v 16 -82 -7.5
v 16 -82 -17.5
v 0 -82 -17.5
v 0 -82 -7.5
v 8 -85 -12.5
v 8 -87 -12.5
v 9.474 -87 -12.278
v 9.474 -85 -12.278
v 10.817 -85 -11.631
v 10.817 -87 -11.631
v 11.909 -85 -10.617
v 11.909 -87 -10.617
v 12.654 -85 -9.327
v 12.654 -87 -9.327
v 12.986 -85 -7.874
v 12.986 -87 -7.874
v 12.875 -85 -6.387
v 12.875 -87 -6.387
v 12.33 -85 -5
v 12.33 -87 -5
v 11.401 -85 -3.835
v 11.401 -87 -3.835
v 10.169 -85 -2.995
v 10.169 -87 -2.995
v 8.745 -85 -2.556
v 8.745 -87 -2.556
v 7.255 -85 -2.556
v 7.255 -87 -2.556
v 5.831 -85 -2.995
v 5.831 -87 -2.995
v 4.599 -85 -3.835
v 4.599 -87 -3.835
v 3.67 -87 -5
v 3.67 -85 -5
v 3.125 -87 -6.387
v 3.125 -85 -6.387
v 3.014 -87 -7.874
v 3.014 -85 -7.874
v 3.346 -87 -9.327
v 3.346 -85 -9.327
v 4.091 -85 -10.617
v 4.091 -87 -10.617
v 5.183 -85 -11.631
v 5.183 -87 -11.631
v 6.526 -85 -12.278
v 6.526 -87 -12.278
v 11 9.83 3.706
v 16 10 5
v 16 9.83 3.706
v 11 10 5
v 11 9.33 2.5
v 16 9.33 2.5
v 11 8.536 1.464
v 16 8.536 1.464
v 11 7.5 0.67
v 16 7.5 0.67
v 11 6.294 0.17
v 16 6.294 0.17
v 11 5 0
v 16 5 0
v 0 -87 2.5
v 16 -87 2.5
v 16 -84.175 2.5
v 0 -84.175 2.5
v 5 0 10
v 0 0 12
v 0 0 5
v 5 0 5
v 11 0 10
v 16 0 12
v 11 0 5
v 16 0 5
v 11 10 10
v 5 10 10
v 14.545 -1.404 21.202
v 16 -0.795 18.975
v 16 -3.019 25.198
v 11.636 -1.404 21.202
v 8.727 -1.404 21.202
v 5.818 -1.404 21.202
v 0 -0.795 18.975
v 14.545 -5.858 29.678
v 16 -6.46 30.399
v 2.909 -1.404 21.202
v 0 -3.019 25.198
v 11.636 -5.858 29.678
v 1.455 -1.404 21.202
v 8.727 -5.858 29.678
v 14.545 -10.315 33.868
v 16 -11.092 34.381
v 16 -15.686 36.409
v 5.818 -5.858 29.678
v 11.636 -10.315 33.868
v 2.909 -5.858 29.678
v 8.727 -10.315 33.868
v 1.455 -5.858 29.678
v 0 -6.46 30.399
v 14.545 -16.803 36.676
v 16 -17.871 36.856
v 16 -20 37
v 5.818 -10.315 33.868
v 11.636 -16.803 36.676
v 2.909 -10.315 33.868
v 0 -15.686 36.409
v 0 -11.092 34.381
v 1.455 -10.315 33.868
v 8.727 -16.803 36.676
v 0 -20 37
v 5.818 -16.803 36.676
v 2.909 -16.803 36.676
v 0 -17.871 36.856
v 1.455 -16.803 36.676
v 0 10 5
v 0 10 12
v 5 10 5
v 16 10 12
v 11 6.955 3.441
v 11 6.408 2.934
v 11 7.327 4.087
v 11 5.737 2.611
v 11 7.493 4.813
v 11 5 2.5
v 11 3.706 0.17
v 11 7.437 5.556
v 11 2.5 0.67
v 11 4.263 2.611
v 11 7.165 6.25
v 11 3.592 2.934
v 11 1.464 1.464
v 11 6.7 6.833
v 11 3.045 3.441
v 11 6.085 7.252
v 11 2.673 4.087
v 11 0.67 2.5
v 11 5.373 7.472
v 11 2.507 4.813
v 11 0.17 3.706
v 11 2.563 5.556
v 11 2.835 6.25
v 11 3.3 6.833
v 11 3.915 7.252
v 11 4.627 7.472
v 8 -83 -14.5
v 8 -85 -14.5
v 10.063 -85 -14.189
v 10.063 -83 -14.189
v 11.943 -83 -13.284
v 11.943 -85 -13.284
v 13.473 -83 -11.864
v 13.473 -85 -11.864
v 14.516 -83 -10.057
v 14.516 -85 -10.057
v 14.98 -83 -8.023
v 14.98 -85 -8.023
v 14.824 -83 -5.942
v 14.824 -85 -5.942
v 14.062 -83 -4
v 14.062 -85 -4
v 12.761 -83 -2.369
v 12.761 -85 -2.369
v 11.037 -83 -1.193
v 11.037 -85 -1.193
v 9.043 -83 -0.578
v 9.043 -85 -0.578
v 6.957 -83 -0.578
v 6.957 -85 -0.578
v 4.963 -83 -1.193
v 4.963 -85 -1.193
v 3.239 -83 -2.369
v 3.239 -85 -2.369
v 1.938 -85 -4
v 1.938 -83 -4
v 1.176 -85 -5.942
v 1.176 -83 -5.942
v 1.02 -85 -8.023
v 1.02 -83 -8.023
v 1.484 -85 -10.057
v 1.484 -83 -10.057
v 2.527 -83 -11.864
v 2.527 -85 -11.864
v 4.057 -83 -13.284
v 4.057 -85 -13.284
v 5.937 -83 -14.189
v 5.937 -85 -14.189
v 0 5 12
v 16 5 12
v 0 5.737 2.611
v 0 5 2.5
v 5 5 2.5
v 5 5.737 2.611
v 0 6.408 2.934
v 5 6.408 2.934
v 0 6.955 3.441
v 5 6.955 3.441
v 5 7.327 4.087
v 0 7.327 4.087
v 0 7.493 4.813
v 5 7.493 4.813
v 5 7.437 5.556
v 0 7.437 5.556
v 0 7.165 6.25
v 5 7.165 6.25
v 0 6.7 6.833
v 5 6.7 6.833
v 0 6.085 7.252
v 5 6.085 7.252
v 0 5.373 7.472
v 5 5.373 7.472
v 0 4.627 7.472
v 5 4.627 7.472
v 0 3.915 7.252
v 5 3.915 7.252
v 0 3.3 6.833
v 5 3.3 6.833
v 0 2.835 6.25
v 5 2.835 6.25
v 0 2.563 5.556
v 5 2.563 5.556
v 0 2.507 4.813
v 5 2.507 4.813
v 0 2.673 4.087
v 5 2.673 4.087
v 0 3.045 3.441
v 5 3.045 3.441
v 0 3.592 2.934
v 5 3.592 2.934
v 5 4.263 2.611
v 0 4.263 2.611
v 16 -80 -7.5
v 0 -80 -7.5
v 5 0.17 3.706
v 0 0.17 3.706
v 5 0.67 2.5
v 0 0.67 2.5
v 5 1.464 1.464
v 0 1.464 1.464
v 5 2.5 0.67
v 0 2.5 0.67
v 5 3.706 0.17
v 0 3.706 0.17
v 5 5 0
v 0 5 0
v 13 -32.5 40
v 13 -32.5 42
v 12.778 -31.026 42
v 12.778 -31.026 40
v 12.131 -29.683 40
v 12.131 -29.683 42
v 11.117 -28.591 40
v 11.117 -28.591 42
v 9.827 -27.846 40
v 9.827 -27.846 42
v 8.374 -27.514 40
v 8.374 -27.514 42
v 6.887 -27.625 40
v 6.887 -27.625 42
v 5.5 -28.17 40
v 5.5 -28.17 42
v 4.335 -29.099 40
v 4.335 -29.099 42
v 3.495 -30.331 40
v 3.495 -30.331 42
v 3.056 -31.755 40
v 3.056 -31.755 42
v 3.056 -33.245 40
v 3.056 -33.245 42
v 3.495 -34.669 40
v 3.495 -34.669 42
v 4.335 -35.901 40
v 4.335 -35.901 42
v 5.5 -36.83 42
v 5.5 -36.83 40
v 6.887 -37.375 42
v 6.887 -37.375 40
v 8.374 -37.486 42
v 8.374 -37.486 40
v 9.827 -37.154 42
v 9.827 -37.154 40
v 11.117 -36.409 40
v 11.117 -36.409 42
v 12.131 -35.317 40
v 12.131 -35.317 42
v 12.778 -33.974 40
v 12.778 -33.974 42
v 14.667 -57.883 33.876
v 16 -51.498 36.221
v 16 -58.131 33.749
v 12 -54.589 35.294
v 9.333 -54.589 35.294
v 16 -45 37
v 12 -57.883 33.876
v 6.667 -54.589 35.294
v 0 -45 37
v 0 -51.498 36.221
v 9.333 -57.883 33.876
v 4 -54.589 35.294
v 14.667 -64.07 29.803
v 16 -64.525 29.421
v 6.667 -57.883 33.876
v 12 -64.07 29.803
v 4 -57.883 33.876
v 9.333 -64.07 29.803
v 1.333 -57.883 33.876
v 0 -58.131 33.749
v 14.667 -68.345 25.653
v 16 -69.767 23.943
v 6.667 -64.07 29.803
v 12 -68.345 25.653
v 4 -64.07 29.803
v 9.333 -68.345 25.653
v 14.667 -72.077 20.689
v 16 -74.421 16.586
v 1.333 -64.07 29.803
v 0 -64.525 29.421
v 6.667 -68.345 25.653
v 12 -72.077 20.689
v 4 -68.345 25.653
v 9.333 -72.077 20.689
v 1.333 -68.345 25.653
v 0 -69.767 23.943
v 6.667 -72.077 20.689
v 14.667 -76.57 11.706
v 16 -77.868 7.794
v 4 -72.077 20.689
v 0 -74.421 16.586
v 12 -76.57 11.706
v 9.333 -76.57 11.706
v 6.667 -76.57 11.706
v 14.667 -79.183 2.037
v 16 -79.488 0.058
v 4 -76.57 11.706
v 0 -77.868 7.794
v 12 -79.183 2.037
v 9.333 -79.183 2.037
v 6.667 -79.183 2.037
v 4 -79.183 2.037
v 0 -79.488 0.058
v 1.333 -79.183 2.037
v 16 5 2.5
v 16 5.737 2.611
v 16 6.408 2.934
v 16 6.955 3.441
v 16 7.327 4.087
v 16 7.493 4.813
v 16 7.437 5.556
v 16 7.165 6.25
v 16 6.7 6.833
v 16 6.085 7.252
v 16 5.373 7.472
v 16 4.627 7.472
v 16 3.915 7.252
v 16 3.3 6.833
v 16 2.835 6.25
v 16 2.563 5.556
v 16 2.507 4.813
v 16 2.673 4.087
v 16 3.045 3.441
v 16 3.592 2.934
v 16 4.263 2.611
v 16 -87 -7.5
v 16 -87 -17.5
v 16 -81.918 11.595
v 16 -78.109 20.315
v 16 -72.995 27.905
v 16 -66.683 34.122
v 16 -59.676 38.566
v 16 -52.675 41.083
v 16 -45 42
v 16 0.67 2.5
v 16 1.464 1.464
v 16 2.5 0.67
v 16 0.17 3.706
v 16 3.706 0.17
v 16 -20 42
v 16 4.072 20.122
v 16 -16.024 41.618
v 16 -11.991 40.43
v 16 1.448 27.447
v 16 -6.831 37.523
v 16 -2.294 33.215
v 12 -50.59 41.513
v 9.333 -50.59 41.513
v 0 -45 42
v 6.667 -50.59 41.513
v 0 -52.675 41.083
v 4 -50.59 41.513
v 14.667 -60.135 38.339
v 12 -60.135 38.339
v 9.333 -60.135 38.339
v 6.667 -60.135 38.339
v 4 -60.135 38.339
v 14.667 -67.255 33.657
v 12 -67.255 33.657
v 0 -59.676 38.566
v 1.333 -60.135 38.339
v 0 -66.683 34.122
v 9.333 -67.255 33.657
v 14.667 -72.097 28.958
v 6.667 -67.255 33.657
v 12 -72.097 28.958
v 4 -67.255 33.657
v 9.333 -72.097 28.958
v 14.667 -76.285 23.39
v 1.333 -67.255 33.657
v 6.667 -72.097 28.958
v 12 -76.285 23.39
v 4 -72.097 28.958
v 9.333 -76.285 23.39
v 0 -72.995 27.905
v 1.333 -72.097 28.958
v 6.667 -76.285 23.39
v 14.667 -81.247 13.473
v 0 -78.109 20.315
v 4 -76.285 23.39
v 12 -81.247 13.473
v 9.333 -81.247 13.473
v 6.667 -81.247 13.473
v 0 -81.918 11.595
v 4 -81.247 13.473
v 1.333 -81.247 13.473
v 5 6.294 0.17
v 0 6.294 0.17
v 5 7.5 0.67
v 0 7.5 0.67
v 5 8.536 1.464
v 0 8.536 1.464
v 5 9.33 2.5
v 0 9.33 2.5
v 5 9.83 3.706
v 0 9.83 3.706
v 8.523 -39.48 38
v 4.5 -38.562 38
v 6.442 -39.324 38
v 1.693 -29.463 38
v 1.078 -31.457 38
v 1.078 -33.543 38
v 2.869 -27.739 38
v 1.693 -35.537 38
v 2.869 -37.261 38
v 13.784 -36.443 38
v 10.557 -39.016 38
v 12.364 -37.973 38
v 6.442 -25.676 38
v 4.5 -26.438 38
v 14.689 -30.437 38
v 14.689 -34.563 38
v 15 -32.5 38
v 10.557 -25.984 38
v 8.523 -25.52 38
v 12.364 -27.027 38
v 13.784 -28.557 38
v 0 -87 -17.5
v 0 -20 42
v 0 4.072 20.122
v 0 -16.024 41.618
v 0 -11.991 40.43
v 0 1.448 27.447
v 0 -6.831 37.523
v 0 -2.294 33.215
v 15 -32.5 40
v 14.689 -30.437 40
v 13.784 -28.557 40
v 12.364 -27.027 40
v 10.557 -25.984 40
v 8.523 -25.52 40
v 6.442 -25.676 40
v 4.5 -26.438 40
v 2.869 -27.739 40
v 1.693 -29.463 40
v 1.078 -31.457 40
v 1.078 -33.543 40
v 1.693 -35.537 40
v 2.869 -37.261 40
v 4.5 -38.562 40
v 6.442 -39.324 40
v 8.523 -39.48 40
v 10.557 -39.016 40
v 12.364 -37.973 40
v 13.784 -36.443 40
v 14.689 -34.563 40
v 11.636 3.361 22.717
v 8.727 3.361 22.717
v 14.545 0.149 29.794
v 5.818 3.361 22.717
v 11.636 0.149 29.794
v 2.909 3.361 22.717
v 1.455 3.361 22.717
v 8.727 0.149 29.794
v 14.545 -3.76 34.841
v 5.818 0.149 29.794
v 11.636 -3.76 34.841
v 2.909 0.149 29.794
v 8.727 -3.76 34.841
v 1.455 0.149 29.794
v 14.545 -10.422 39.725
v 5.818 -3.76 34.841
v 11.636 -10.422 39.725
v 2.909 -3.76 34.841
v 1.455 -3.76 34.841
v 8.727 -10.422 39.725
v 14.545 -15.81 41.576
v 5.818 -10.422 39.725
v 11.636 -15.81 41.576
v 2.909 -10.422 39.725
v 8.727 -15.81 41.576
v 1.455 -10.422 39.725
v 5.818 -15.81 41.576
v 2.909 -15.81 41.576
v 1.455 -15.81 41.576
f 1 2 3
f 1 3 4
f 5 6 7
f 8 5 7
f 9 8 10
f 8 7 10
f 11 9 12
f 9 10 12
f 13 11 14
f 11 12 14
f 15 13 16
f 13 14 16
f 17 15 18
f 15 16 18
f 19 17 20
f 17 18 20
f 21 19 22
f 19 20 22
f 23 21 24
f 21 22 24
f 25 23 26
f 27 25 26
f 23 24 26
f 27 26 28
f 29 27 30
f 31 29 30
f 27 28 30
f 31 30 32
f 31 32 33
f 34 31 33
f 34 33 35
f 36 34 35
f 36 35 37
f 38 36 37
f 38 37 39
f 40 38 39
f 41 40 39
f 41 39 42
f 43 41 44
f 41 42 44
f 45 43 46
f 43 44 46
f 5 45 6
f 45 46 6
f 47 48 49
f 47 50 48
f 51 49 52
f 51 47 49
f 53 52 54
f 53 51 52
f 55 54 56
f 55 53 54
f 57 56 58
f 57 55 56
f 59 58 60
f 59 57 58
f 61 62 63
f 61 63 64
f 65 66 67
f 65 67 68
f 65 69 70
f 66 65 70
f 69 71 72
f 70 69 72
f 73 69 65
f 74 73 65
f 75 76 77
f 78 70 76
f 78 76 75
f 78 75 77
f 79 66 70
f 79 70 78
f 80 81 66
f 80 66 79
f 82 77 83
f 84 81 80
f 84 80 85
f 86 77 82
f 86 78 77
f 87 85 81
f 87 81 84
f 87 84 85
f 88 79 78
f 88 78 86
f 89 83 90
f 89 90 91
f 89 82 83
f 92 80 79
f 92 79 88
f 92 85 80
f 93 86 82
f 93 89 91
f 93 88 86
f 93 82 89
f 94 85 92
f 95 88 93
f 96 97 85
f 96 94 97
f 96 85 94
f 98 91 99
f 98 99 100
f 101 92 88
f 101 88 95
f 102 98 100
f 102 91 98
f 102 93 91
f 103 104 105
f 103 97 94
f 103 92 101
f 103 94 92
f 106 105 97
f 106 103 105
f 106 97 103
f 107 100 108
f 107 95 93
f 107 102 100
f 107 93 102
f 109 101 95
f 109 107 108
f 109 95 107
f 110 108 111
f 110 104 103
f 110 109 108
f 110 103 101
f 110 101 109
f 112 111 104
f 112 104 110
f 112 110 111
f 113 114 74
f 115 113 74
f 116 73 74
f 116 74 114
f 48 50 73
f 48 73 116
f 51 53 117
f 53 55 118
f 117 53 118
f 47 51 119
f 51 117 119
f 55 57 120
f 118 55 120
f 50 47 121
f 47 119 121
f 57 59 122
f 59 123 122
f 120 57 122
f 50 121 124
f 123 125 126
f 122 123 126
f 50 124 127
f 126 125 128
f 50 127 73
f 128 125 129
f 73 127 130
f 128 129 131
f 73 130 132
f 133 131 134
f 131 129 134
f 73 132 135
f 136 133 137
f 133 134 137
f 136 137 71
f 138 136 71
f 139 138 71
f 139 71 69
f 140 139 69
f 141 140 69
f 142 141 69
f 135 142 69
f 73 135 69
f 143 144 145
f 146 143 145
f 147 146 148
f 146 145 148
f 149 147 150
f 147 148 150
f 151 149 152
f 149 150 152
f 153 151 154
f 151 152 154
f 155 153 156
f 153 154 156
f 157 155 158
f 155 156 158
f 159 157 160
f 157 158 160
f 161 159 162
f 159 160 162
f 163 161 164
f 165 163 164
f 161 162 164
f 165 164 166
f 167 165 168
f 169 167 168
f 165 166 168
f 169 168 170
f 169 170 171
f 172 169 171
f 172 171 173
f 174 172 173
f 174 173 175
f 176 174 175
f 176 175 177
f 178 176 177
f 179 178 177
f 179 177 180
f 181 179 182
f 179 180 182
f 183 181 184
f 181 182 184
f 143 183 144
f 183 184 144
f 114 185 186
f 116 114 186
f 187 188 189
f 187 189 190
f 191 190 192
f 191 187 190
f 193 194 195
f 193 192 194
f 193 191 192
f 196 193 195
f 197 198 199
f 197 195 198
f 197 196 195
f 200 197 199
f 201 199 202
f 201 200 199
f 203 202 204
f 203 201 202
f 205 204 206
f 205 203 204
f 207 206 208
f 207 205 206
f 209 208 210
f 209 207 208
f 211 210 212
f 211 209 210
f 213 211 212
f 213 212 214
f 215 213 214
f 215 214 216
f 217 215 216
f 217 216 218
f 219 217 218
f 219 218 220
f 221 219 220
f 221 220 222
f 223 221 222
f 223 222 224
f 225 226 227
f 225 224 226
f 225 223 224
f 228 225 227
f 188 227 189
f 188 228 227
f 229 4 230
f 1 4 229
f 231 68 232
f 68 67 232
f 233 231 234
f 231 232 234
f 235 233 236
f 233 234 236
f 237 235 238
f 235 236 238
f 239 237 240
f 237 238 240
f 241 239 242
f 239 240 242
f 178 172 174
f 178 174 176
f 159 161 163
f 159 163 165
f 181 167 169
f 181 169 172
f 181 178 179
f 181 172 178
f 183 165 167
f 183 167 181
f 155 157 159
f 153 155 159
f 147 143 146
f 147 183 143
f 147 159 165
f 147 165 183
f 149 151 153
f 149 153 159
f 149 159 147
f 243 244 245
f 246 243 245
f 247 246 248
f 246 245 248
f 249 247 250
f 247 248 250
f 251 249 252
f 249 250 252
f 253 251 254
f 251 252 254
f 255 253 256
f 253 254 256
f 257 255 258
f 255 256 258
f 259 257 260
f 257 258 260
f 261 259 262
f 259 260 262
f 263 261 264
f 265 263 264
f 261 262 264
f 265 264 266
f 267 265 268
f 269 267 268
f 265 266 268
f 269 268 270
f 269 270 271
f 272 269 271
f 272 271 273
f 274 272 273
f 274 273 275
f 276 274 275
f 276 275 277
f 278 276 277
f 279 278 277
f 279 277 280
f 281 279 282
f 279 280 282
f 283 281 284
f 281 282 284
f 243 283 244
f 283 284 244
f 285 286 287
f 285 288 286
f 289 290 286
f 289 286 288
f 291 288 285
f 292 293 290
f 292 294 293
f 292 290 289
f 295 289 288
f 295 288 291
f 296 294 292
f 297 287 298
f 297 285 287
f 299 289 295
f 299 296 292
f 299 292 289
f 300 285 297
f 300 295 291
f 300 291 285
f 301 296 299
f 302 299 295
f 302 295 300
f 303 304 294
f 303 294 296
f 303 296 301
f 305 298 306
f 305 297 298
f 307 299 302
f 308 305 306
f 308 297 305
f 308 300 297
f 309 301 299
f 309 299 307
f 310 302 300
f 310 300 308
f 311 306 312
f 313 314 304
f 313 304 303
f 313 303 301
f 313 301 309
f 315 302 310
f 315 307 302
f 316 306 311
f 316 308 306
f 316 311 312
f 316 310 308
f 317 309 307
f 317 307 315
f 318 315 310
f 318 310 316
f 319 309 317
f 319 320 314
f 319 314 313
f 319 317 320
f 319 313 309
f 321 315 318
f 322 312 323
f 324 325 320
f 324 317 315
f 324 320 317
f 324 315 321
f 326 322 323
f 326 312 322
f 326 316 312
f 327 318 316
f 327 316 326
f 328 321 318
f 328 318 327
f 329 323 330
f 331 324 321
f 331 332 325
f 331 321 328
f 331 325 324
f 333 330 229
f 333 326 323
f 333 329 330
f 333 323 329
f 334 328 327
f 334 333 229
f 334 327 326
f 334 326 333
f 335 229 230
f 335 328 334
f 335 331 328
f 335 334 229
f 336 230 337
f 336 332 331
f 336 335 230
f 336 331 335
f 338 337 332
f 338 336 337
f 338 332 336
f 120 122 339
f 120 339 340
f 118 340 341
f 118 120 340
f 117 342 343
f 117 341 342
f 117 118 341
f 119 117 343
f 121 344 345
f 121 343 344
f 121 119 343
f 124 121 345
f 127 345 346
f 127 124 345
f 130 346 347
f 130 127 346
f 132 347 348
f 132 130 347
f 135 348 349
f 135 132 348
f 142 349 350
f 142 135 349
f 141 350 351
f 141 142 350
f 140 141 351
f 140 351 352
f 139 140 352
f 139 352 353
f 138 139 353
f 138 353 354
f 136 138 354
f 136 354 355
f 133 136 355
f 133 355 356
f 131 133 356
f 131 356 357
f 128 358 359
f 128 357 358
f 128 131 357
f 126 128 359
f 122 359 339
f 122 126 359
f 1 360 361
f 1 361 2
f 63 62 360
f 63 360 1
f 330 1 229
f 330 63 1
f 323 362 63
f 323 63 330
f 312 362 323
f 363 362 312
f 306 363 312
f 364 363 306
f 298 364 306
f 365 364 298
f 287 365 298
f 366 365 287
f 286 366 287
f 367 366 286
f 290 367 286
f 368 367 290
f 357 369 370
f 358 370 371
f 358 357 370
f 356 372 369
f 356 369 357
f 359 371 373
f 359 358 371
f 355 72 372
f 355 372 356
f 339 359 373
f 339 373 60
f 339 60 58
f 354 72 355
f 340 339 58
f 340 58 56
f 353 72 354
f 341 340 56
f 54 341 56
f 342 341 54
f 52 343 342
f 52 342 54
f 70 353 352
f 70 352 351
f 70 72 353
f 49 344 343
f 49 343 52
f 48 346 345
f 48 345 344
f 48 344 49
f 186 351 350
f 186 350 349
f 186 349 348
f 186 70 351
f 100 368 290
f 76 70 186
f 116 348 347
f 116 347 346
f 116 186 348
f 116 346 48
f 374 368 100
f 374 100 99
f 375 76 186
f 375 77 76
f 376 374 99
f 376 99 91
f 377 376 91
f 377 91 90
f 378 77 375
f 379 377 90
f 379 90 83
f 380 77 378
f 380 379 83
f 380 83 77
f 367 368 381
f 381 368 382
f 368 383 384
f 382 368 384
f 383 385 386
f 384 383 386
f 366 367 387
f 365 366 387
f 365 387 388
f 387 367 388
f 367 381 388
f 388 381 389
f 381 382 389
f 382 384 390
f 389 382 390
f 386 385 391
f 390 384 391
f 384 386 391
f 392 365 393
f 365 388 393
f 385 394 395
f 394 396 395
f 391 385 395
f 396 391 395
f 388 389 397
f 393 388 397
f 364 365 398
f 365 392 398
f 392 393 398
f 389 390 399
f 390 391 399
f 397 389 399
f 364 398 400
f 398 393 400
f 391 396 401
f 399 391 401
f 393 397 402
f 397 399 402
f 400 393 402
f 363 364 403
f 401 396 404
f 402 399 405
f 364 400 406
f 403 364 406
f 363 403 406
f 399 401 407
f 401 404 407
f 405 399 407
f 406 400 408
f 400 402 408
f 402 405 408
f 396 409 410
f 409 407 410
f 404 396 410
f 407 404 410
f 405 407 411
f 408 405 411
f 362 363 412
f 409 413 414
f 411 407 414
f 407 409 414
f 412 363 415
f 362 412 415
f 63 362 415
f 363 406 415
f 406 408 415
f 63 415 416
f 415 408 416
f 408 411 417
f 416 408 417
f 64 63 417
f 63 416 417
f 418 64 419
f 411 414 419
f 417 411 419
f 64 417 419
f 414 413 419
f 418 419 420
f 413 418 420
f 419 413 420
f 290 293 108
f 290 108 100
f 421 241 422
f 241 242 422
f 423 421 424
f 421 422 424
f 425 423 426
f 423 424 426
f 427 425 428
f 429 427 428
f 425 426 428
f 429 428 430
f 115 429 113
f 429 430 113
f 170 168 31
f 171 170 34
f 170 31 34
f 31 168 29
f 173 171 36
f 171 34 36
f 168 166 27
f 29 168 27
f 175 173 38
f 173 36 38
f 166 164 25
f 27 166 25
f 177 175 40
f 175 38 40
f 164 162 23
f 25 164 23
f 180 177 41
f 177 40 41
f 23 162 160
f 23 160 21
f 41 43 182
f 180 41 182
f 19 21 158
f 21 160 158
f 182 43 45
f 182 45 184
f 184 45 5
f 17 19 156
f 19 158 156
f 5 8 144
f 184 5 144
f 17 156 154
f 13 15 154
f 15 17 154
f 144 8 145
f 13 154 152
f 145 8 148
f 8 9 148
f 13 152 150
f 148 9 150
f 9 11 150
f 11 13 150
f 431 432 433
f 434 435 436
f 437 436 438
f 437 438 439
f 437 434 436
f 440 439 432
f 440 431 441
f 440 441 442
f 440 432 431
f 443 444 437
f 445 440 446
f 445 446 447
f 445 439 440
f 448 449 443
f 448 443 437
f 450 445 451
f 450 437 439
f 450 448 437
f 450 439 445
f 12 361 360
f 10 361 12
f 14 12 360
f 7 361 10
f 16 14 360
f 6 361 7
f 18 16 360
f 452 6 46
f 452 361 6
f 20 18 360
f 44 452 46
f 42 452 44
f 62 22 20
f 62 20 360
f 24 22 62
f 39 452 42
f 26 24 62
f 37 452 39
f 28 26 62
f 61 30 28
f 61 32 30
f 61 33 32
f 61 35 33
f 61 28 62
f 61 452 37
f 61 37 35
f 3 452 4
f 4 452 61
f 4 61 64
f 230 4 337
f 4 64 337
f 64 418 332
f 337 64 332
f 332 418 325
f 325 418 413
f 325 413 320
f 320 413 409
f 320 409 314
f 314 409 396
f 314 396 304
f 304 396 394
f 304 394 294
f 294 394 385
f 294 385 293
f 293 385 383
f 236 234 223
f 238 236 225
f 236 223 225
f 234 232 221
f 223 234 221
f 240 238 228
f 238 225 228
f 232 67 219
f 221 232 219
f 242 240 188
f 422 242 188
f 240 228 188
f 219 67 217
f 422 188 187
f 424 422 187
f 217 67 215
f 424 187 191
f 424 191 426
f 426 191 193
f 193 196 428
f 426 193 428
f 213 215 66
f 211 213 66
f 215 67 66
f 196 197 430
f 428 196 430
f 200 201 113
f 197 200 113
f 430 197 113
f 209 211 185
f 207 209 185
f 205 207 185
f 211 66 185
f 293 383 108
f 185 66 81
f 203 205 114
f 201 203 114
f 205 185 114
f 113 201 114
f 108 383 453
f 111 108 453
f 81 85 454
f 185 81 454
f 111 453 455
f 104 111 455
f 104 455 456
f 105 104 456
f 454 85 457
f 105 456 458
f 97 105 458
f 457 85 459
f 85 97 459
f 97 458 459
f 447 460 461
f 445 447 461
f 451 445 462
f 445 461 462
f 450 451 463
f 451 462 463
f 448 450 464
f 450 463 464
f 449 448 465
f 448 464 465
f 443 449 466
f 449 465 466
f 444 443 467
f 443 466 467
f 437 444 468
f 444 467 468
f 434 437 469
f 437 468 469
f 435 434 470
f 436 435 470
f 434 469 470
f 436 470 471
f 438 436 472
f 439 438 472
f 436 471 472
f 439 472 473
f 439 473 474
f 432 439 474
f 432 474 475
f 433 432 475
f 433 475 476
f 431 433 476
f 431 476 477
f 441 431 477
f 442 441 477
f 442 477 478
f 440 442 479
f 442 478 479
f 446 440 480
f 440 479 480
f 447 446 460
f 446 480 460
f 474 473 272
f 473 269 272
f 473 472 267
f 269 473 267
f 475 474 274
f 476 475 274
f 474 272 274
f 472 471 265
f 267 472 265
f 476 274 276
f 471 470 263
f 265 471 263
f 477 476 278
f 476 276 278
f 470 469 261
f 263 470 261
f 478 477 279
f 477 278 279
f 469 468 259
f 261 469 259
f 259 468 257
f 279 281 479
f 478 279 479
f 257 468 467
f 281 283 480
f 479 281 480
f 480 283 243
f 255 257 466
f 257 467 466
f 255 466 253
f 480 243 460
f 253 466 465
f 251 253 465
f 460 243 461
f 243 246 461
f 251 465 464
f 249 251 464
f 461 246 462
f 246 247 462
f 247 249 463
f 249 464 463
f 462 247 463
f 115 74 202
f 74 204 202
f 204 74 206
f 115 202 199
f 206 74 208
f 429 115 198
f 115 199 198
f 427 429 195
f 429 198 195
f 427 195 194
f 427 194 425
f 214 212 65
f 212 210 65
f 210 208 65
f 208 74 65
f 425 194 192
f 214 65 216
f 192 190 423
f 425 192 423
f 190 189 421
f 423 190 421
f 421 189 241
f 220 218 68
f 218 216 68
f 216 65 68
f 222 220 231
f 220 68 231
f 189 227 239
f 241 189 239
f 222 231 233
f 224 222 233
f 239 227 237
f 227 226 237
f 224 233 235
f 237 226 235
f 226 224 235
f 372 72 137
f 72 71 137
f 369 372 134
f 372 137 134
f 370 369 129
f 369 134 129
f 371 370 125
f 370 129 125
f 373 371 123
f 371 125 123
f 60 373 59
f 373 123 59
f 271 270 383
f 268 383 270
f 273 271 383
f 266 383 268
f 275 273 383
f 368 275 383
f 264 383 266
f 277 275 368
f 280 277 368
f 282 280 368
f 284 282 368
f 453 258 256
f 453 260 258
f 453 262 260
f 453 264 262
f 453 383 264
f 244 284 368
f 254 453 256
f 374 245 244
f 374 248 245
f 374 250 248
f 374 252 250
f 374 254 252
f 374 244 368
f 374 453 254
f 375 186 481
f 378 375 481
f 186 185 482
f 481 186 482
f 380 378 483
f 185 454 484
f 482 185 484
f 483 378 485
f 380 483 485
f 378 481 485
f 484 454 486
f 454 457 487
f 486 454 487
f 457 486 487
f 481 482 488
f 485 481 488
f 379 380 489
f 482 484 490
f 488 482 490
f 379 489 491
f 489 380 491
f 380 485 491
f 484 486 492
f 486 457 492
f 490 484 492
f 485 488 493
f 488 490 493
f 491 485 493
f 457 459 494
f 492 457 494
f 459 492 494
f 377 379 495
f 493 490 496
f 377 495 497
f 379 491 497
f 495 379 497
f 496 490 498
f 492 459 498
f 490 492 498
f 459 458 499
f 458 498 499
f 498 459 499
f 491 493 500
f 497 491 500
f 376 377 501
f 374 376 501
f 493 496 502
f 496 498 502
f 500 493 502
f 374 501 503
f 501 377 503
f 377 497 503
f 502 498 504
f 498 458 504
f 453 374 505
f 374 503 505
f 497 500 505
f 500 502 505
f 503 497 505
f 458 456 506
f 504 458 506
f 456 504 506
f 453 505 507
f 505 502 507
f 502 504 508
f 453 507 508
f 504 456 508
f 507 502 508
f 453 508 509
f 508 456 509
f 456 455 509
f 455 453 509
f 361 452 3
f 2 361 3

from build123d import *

# Parameters (mm, degrees)
BOSS_EXTRUDE2_DEPTH     = 10
CUT_EXTRUDE1_DEPTH      = 20.104973175
CUT_EXTRUDE1_DEPTH_BACK = 20.104973175
SKETCH3_R               = 2.5
SWEEP2_DEPTH            = 16
SKETCH6_W               = 16
SKETCH6_H               = 5
BOSS_EXTRUDE3_DEPTH     = 25
SWEEP4_DEPTH            = 16
BOSS_EXTRUDE6_START     = -2
BOSS_EXTRUDE6_DEPTH     = 5
MIRROR1_OUTLINE_W       = 5
MIRROR1_OUTLINE_H       = 10
MIRROR1_DEPTH           = 16
SKETCH10_R              = 5
CUT_EXTRUDE2_DEPTH      = 2
SKETCH11_R              = 7
CUT_EXTRUDE3_DEPTH      = 2
SKETCH12_R              = 5
CUT_EXTRUDE4_DEPTH      = 2
SKETCH13_R              = 7
CUT_EXTRUDE5_DEPTH      = 2
FILLET1_R               = 5


# Read off the part's stored shape, not the designer's step: Sweep2, Sweep4, Mirror1
with BuildPart() as part:
    # Sketch1 → Boss-Extrude2 (new body)
    with BuildSketch(Plane(origin=(0, 0, 0), x_dir=(1, 0, 0), z_dir=(0, 1, 0))):
        Polygon((16, 0), (11, 0), (11, -10), (5, -10), (5, 0), (0, 0), (0, -12), (16, -12), align=None)
    extrude(amount=BOSS_EXTRUDE2_DEPTH)

    # Sketch3 → Cut-Extrude1 (cut, two sides: drawn at the far end of the back side and taken through both)
    with BuildSketch(Plane(origin=(5, 0, 0), x_dir=(0, 0, -1), z_dir=(1, 0, 0)).offset(-CUT_EXTRUDE1_DEPTH_BACK)):
        with Locations((-5, 5)):
            Circle(SKETCH3_R)
    extrude(amount=CUT_EXTRUDE1_DEPTH + CUT_EXTRUDE1_DEPTH_BACK, mode=Mode.SUBTRACT)

    # Sweep2 outline → Sweep2 (add)
    with BuildSketch(Plane.YZ):
        with BuildLine():
            Line((0, 12), (5, 12))
            add(Edge.make_bspline(
                [(5, 12), (4.988564835, 13.918737728), (4.727583023, 17.475192083), (3.864503942, 21.128495988), (3.223332084, 23.150620925), (2.391953002, 25.596644311), (0.741742694, 29.07437946), (-1.195562511, 31.850987055), (-2.528545692, 33.517302555), (-4.236222293, 35.44635739), (-7.052881596, 37.829760239), (-9.410175401, 39.223738473), (-10.800753457, 39.913031483), (-12.581881784, 40.734670966), (-15.819763626, 41.734575995), (-18.630582656, 41.980830062), (-20, 42)],
                knots=[0, 0, 0, 0, 0.14, 0.25, 0.25, 0.28, 0.42, 0.5, 0.5, 0.56, 0.67, 0.75, 0.75, 0.78, 0.89, 1, 1, 1, 1], degree=3))
            Line((-20, 42), (-20, 37))
            add(Edge.make_bspline(
                [(0, 12), (0, 13.649915823), (-0.240561875, 16.726331061), (-0.97538393, 19.848301285), (-1.521193083, 21.57165859), (-2.228979288, 23.654488426), (-3.634756743, 26.603340395), (-5.233025509, 28.896620946), (-6.326493526, 30.263455967), (-7.72168743, 31.836224776), (-10.002621636, 33.761203681), (-11.850285326, 34.854843846), (-12.93353849, 35.390906407), (-14.317667102, 36.027380757), (-16.81674582, 36.792085808), (-18.962910054, 37), (-20, 37)],
                knots=[0, 0, 0, 0, 0.14, 0.25, 0.25, 0.28, 0.42, 0.5, 0.5, 0.56, 0.67, 0.75, 0.75, 0.78, 0.89, 1, 1, 1, 1], degree=3))
        make_face()
    extrude(amount=SWEEP2_DEPTH)

    # Sketch6 → Boss-Extrude3 (add)
    with BuildSketch(Plane.XZ.offset(20)):
        with Locations((8, 39.5)):
            Rectangle(SKETCH6_W, SKETCH6_H)
    extrude(amount=BOSS_EXTRUDE3_DEPTH)

    # Sweep4 outline → Sweep4 (add)
    with BuildSketch(Plane.YZ):
        with BuildLine():
            add(Edge.make_bspline(
                [(-45, 37), (-46.539921435, 37), (-49.710455321, 36.733564359), (-54.069426949, 35.591421338), (-56.791855208, 34.424962301), (-58.400322026, 33.61534539), (-60.515823703, 32.472825795), (-64.131778614, 29.955184919), (-67.512968495, 26.682711344), (-69.293125668, 24.545529462), (-70.568838354, 22.923551904), (-73.245629189, 19.149689178), (-75.823464115, 13.964627374), (-77.246943912, 9.829702386), (-78.247594027, 6.616051335), (-79.558969896, 1.063749954), (-80, -4.423299828), (-80, -7.5)],
                knots=[0, 0, 0, 0, 0.093333333, 0.186666667, 0.25, 0.25, 0.28, 0.373333333, 0.466666667, 0.5, 0.5, 0.56, 0.706666667, 0.75, 0.75, 0.853333333, 1, 1, 1, 1], degree=3))
            Line((-45, 37), (-45, 42))
            add(Edge.make_bspline(
                [(-45, 42), (-46.827228691, 41.985546272), (-50.572377089, 41.690203176), (-55.680170711, 40.34427149), (-58.86435237, 38.978190659), (-60.736493627, 38.036368786), (-63.19327858, 36.710836458), (-67.336625432, 33.820292899), (-71.161008214, 30.117283698), (-73.164977368, 27.709927549), (-74.598724896, 25.886689015), (-77.598031299, 21.658467407), (-80.427894177, 15.95136859), (-81.990291212, 11.413560853), (-83.08845552, 7.889758882), (-84.526539356, 1.812231065), (-84.988008876, -4.14655051), (-85, -7.5)],
                knots=[0, 0, 0, 0, 0.093333333, 0.186666667, 0.25, 0.25, 0.28, 0.373333333, 0.466666667, 0.5, 0.5, 0.56, 0.706666667, 0.75, 0.75, 0.853333333, 1, 1, 1, 1], degree=3))
            Line((-85, -7.5), (-80, -7.5))
        make_face()
    extrude(amount=SWEEP4_DEPTH)

    # 3DSketch1 → Boss-Extrude6 (add)
    with BuildSketch(Plane(origin=(0, -85, -7.5), x_dir=(0.8479983040050887, 0, 0.5299989400031789), z_dir=(0, 1, 0)).offset(BOSS_EXTRUDE6_START)):
        Polygon((0, 0), (13.567972864, 8.47998304), (18.867962264, 0), (5.2999894, -8.47998304), align=None)
    extrude(amount=BOSS_EXTRUDE6_DEPTH)

    # Mirror1 outline → Mirror1 (add)
    with BuildSketch(Plane.YZ):
        with Locations((-84.5, -12.5)):
            Rectangle(MIRROR1_OUTLINE_W, MIRROR1_OUTLINE_H)
    extrude(amount=MIRROR1_DEPTH)

    # Sketch10 → Cut-Extrude2 (cut)
    with BuildSketch(Plane.XY.offset(42)):
        with Locations((8, -32.5)):
            Circle(SKETCH10_R)
    extrude(amount=-CUT_EXTRUDE2_DEPTH, mode=Mode.SUBTRACT)

    # Sketch11 → Cut-Extrude3 (cut)
    with BuildSketch(Plane.XY.offset(40)):
        with Locations((8, -32.5)):
            Circle(SKETCH11_R)
    extrude(amount=-CUT_EXTRUDE3_DEPTH, mode=Mode.SUBTRACT)

    # Sketch12 → Cut-Extrude4 (cut)
    with BuildSketch(Plane.XZ.offset(87)):
        with Locations(Location((8, -7.5, 0), (0, 0, 270))):
            Circle(SKETCH12_R)
    extrude(amount=-CUT_EXTRUDE4_DEPTH, mode=Mode.SUBTRACT)

    # Sketch13 → Cut-Extrude5 (cut)
    with BuildSketch(Plane.XZ.offset(85)):
        with Locations(Location((8, -7.5, 0), (0, 0, 270))):
            Circle(SKETCH13_R)
    extrude(amount=-CUT_EXTRUDE5_DEPTH, mode=Mode.SUBTRACT)

    # Fillet1
    fillet1_edges = [part.edges().sort_by_distance(p)[0] for p in [
        (13.5, 10, 0),
        (13.5, 0, 0),
        (2.5, 0, 0),
        (2.5, 10, 0),
    ]]
    fillet(fillet1_edges, radius=FILLET1_R - 0.0001)  # a hair under: the kernel refuses the full size


solid = part.part
